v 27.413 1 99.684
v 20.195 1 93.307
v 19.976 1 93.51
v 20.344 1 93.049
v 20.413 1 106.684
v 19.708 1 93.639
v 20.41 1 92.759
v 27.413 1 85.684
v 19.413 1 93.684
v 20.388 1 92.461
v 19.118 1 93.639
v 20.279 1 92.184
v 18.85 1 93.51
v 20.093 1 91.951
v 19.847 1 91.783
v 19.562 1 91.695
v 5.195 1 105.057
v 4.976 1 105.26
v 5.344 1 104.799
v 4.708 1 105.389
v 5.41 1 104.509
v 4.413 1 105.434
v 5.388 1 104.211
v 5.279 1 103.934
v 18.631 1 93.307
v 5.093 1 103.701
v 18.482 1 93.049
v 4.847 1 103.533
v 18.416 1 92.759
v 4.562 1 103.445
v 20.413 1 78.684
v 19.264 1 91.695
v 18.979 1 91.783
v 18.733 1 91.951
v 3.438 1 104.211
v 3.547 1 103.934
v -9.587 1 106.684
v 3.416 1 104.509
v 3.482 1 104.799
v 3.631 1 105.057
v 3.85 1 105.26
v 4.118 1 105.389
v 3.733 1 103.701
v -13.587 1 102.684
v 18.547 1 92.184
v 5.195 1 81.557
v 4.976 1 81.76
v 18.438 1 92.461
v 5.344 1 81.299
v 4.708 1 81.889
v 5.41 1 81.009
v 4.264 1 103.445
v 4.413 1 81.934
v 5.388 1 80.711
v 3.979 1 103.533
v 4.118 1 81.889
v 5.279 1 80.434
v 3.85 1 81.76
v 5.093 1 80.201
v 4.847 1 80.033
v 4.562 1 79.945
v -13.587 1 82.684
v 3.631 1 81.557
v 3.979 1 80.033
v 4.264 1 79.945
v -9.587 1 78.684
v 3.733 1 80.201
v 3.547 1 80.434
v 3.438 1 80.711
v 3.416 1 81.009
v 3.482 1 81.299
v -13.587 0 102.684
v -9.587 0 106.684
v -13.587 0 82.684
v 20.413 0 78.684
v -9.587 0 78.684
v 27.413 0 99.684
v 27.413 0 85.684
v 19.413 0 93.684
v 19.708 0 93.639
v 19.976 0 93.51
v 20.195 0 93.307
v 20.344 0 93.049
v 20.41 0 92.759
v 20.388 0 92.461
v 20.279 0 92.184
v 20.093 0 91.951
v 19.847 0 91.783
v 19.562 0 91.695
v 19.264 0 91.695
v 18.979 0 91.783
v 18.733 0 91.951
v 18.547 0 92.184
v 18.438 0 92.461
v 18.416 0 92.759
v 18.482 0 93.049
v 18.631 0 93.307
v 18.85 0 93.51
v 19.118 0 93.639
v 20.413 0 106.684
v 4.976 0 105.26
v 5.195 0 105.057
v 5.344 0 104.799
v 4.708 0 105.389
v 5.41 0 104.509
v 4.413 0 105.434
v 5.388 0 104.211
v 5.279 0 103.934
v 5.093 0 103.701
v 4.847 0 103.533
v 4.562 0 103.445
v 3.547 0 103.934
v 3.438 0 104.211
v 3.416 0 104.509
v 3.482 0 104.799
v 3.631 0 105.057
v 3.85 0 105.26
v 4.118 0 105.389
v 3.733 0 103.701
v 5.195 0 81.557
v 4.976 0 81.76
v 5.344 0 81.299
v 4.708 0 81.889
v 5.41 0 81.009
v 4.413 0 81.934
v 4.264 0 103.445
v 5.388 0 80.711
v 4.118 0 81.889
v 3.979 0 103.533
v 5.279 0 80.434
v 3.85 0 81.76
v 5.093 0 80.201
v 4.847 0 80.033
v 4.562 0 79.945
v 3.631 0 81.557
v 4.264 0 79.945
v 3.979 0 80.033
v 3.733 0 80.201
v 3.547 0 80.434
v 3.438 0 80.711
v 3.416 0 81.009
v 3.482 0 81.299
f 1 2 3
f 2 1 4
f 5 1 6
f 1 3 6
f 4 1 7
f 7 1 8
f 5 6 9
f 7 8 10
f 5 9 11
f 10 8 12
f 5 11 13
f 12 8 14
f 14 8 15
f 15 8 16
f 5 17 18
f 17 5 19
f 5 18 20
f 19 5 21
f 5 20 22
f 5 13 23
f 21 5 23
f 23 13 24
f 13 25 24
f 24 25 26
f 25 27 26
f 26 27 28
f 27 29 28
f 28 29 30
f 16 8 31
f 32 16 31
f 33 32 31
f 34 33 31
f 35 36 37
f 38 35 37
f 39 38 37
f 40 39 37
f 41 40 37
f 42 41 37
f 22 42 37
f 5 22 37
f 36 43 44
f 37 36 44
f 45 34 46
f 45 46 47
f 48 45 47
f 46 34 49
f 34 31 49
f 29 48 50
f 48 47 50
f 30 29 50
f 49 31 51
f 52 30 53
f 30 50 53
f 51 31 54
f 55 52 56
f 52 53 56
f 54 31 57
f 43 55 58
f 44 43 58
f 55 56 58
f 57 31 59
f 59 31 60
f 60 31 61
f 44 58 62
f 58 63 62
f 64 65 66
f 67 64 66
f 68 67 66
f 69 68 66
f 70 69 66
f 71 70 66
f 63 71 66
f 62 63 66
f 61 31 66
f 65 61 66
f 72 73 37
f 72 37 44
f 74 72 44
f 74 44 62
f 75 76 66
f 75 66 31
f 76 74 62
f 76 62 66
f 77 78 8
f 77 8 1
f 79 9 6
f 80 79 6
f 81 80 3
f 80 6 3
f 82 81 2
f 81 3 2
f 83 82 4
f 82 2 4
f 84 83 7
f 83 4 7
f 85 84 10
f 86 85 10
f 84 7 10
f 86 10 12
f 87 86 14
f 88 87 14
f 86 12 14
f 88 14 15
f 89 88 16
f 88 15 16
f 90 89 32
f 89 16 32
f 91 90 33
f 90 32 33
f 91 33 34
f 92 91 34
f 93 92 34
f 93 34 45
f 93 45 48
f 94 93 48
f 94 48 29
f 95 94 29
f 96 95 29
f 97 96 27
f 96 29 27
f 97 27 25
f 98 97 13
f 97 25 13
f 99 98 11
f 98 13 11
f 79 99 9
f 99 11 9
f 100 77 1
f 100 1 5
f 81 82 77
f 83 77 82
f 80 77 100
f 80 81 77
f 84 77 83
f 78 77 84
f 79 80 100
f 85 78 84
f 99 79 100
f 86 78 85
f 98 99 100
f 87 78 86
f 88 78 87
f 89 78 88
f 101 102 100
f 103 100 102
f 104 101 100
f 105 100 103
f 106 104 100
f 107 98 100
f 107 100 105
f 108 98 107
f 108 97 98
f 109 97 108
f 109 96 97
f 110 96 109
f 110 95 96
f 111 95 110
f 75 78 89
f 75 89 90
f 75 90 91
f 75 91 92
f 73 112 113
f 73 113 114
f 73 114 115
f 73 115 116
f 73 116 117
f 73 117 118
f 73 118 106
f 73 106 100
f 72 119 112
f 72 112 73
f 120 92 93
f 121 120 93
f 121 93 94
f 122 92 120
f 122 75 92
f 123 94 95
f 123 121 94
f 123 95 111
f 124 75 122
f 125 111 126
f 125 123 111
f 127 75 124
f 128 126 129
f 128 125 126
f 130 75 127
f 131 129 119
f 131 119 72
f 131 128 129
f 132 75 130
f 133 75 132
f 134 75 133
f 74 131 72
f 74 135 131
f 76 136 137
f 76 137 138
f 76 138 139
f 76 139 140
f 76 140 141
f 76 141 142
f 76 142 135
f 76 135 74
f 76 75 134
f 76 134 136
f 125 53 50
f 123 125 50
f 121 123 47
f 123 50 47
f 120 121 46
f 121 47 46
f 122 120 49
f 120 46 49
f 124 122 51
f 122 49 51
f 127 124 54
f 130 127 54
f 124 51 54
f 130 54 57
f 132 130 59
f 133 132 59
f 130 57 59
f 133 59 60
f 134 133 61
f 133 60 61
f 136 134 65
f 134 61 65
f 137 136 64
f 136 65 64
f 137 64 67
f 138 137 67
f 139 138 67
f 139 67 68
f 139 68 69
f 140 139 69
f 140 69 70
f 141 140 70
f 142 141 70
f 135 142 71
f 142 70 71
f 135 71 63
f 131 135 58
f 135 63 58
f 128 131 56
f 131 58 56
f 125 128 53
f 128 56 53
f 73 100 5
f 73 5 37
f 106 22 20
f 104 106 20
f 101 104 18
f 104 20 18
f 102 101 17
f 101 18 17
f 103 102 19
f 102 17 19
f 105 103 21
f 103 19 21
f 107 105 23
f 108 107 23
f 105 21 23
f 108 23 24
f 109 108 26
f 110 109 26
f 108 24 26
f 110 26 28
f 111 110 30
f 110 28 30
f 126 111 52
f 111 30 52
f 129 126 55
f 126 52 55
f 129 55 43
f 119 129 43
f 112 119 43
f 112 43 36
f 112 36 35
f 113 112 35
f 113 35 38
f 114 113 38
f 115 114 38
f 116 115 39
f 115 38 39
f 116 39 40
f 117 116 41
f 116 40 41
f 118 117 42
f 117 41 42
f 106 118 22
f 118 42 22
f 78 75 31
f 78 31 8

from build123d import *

# Parameters (mm, degrees)
BOSS_EXTRUDE1_DEPTH = 1
SKETCH2_R           = 1
CUT_EXTRUDE1_DEPTH  = 1
SKETCH4_R           = 1
CUT_EXTRUDE2_DEPTH  = 1


with BuildPart() as part:
    # Sketch1 → Boss-Extrude1 (new body)
    with BuildSketch(Plane(origin=(0, 0, 0), x_dir=(1, 0, 0), z_dir=(0, 1, 0))):
        Polygon((-13.58704372, -102.683820402), (-13.58704372, -82.683820402), (-9.58704372, -78.683820402), (20.41295628, -78.683820402), (27.41295628, -85.683820402), (27.41295628, -99.683820402), (20.41295628, -106.683820402), (-9.58704372, -106.683820402), align=None)
    extrude(amount=BOSS_EXTRUDE1_DEPTH)

    # Sketch2 → Cut-Extrude1 (cut)
    with BuildSketch(Plane(origin=(0, 1, 0), x_dir=(1, 0, 0), z_dir=(0, 1, 0))):
        with Locations(Location((19.41295628, -92.683820402, 0), (0, 0, 270))):
            Circle(SKETCH2_R)
    extrude(amount=-CUT_EXTRUDE1_DEPTH, mode=Mode.SUBTRACT)

    # Sketch4 → Cut-Extrude2 (cut)
    with BuildSketch(Plane(origin=(0, 1, 0), x_dir=(1, 0, 0), z_dir=(0, 1, 0))):
        with Locations(Location((4.41295628, -104.433820402, 0), (0, 0, 270))):
            Circle(SKETCH4_R)
        with Locations(Location((4.41295628, -80.933820402, 0), (0, 0, 270))):
            Circle(SKETCH4_R)
    extrude(amount=-CUT_EXTRUDE2_DEPTH, mode=Mode.SUBTRACT)


solid = part.part
